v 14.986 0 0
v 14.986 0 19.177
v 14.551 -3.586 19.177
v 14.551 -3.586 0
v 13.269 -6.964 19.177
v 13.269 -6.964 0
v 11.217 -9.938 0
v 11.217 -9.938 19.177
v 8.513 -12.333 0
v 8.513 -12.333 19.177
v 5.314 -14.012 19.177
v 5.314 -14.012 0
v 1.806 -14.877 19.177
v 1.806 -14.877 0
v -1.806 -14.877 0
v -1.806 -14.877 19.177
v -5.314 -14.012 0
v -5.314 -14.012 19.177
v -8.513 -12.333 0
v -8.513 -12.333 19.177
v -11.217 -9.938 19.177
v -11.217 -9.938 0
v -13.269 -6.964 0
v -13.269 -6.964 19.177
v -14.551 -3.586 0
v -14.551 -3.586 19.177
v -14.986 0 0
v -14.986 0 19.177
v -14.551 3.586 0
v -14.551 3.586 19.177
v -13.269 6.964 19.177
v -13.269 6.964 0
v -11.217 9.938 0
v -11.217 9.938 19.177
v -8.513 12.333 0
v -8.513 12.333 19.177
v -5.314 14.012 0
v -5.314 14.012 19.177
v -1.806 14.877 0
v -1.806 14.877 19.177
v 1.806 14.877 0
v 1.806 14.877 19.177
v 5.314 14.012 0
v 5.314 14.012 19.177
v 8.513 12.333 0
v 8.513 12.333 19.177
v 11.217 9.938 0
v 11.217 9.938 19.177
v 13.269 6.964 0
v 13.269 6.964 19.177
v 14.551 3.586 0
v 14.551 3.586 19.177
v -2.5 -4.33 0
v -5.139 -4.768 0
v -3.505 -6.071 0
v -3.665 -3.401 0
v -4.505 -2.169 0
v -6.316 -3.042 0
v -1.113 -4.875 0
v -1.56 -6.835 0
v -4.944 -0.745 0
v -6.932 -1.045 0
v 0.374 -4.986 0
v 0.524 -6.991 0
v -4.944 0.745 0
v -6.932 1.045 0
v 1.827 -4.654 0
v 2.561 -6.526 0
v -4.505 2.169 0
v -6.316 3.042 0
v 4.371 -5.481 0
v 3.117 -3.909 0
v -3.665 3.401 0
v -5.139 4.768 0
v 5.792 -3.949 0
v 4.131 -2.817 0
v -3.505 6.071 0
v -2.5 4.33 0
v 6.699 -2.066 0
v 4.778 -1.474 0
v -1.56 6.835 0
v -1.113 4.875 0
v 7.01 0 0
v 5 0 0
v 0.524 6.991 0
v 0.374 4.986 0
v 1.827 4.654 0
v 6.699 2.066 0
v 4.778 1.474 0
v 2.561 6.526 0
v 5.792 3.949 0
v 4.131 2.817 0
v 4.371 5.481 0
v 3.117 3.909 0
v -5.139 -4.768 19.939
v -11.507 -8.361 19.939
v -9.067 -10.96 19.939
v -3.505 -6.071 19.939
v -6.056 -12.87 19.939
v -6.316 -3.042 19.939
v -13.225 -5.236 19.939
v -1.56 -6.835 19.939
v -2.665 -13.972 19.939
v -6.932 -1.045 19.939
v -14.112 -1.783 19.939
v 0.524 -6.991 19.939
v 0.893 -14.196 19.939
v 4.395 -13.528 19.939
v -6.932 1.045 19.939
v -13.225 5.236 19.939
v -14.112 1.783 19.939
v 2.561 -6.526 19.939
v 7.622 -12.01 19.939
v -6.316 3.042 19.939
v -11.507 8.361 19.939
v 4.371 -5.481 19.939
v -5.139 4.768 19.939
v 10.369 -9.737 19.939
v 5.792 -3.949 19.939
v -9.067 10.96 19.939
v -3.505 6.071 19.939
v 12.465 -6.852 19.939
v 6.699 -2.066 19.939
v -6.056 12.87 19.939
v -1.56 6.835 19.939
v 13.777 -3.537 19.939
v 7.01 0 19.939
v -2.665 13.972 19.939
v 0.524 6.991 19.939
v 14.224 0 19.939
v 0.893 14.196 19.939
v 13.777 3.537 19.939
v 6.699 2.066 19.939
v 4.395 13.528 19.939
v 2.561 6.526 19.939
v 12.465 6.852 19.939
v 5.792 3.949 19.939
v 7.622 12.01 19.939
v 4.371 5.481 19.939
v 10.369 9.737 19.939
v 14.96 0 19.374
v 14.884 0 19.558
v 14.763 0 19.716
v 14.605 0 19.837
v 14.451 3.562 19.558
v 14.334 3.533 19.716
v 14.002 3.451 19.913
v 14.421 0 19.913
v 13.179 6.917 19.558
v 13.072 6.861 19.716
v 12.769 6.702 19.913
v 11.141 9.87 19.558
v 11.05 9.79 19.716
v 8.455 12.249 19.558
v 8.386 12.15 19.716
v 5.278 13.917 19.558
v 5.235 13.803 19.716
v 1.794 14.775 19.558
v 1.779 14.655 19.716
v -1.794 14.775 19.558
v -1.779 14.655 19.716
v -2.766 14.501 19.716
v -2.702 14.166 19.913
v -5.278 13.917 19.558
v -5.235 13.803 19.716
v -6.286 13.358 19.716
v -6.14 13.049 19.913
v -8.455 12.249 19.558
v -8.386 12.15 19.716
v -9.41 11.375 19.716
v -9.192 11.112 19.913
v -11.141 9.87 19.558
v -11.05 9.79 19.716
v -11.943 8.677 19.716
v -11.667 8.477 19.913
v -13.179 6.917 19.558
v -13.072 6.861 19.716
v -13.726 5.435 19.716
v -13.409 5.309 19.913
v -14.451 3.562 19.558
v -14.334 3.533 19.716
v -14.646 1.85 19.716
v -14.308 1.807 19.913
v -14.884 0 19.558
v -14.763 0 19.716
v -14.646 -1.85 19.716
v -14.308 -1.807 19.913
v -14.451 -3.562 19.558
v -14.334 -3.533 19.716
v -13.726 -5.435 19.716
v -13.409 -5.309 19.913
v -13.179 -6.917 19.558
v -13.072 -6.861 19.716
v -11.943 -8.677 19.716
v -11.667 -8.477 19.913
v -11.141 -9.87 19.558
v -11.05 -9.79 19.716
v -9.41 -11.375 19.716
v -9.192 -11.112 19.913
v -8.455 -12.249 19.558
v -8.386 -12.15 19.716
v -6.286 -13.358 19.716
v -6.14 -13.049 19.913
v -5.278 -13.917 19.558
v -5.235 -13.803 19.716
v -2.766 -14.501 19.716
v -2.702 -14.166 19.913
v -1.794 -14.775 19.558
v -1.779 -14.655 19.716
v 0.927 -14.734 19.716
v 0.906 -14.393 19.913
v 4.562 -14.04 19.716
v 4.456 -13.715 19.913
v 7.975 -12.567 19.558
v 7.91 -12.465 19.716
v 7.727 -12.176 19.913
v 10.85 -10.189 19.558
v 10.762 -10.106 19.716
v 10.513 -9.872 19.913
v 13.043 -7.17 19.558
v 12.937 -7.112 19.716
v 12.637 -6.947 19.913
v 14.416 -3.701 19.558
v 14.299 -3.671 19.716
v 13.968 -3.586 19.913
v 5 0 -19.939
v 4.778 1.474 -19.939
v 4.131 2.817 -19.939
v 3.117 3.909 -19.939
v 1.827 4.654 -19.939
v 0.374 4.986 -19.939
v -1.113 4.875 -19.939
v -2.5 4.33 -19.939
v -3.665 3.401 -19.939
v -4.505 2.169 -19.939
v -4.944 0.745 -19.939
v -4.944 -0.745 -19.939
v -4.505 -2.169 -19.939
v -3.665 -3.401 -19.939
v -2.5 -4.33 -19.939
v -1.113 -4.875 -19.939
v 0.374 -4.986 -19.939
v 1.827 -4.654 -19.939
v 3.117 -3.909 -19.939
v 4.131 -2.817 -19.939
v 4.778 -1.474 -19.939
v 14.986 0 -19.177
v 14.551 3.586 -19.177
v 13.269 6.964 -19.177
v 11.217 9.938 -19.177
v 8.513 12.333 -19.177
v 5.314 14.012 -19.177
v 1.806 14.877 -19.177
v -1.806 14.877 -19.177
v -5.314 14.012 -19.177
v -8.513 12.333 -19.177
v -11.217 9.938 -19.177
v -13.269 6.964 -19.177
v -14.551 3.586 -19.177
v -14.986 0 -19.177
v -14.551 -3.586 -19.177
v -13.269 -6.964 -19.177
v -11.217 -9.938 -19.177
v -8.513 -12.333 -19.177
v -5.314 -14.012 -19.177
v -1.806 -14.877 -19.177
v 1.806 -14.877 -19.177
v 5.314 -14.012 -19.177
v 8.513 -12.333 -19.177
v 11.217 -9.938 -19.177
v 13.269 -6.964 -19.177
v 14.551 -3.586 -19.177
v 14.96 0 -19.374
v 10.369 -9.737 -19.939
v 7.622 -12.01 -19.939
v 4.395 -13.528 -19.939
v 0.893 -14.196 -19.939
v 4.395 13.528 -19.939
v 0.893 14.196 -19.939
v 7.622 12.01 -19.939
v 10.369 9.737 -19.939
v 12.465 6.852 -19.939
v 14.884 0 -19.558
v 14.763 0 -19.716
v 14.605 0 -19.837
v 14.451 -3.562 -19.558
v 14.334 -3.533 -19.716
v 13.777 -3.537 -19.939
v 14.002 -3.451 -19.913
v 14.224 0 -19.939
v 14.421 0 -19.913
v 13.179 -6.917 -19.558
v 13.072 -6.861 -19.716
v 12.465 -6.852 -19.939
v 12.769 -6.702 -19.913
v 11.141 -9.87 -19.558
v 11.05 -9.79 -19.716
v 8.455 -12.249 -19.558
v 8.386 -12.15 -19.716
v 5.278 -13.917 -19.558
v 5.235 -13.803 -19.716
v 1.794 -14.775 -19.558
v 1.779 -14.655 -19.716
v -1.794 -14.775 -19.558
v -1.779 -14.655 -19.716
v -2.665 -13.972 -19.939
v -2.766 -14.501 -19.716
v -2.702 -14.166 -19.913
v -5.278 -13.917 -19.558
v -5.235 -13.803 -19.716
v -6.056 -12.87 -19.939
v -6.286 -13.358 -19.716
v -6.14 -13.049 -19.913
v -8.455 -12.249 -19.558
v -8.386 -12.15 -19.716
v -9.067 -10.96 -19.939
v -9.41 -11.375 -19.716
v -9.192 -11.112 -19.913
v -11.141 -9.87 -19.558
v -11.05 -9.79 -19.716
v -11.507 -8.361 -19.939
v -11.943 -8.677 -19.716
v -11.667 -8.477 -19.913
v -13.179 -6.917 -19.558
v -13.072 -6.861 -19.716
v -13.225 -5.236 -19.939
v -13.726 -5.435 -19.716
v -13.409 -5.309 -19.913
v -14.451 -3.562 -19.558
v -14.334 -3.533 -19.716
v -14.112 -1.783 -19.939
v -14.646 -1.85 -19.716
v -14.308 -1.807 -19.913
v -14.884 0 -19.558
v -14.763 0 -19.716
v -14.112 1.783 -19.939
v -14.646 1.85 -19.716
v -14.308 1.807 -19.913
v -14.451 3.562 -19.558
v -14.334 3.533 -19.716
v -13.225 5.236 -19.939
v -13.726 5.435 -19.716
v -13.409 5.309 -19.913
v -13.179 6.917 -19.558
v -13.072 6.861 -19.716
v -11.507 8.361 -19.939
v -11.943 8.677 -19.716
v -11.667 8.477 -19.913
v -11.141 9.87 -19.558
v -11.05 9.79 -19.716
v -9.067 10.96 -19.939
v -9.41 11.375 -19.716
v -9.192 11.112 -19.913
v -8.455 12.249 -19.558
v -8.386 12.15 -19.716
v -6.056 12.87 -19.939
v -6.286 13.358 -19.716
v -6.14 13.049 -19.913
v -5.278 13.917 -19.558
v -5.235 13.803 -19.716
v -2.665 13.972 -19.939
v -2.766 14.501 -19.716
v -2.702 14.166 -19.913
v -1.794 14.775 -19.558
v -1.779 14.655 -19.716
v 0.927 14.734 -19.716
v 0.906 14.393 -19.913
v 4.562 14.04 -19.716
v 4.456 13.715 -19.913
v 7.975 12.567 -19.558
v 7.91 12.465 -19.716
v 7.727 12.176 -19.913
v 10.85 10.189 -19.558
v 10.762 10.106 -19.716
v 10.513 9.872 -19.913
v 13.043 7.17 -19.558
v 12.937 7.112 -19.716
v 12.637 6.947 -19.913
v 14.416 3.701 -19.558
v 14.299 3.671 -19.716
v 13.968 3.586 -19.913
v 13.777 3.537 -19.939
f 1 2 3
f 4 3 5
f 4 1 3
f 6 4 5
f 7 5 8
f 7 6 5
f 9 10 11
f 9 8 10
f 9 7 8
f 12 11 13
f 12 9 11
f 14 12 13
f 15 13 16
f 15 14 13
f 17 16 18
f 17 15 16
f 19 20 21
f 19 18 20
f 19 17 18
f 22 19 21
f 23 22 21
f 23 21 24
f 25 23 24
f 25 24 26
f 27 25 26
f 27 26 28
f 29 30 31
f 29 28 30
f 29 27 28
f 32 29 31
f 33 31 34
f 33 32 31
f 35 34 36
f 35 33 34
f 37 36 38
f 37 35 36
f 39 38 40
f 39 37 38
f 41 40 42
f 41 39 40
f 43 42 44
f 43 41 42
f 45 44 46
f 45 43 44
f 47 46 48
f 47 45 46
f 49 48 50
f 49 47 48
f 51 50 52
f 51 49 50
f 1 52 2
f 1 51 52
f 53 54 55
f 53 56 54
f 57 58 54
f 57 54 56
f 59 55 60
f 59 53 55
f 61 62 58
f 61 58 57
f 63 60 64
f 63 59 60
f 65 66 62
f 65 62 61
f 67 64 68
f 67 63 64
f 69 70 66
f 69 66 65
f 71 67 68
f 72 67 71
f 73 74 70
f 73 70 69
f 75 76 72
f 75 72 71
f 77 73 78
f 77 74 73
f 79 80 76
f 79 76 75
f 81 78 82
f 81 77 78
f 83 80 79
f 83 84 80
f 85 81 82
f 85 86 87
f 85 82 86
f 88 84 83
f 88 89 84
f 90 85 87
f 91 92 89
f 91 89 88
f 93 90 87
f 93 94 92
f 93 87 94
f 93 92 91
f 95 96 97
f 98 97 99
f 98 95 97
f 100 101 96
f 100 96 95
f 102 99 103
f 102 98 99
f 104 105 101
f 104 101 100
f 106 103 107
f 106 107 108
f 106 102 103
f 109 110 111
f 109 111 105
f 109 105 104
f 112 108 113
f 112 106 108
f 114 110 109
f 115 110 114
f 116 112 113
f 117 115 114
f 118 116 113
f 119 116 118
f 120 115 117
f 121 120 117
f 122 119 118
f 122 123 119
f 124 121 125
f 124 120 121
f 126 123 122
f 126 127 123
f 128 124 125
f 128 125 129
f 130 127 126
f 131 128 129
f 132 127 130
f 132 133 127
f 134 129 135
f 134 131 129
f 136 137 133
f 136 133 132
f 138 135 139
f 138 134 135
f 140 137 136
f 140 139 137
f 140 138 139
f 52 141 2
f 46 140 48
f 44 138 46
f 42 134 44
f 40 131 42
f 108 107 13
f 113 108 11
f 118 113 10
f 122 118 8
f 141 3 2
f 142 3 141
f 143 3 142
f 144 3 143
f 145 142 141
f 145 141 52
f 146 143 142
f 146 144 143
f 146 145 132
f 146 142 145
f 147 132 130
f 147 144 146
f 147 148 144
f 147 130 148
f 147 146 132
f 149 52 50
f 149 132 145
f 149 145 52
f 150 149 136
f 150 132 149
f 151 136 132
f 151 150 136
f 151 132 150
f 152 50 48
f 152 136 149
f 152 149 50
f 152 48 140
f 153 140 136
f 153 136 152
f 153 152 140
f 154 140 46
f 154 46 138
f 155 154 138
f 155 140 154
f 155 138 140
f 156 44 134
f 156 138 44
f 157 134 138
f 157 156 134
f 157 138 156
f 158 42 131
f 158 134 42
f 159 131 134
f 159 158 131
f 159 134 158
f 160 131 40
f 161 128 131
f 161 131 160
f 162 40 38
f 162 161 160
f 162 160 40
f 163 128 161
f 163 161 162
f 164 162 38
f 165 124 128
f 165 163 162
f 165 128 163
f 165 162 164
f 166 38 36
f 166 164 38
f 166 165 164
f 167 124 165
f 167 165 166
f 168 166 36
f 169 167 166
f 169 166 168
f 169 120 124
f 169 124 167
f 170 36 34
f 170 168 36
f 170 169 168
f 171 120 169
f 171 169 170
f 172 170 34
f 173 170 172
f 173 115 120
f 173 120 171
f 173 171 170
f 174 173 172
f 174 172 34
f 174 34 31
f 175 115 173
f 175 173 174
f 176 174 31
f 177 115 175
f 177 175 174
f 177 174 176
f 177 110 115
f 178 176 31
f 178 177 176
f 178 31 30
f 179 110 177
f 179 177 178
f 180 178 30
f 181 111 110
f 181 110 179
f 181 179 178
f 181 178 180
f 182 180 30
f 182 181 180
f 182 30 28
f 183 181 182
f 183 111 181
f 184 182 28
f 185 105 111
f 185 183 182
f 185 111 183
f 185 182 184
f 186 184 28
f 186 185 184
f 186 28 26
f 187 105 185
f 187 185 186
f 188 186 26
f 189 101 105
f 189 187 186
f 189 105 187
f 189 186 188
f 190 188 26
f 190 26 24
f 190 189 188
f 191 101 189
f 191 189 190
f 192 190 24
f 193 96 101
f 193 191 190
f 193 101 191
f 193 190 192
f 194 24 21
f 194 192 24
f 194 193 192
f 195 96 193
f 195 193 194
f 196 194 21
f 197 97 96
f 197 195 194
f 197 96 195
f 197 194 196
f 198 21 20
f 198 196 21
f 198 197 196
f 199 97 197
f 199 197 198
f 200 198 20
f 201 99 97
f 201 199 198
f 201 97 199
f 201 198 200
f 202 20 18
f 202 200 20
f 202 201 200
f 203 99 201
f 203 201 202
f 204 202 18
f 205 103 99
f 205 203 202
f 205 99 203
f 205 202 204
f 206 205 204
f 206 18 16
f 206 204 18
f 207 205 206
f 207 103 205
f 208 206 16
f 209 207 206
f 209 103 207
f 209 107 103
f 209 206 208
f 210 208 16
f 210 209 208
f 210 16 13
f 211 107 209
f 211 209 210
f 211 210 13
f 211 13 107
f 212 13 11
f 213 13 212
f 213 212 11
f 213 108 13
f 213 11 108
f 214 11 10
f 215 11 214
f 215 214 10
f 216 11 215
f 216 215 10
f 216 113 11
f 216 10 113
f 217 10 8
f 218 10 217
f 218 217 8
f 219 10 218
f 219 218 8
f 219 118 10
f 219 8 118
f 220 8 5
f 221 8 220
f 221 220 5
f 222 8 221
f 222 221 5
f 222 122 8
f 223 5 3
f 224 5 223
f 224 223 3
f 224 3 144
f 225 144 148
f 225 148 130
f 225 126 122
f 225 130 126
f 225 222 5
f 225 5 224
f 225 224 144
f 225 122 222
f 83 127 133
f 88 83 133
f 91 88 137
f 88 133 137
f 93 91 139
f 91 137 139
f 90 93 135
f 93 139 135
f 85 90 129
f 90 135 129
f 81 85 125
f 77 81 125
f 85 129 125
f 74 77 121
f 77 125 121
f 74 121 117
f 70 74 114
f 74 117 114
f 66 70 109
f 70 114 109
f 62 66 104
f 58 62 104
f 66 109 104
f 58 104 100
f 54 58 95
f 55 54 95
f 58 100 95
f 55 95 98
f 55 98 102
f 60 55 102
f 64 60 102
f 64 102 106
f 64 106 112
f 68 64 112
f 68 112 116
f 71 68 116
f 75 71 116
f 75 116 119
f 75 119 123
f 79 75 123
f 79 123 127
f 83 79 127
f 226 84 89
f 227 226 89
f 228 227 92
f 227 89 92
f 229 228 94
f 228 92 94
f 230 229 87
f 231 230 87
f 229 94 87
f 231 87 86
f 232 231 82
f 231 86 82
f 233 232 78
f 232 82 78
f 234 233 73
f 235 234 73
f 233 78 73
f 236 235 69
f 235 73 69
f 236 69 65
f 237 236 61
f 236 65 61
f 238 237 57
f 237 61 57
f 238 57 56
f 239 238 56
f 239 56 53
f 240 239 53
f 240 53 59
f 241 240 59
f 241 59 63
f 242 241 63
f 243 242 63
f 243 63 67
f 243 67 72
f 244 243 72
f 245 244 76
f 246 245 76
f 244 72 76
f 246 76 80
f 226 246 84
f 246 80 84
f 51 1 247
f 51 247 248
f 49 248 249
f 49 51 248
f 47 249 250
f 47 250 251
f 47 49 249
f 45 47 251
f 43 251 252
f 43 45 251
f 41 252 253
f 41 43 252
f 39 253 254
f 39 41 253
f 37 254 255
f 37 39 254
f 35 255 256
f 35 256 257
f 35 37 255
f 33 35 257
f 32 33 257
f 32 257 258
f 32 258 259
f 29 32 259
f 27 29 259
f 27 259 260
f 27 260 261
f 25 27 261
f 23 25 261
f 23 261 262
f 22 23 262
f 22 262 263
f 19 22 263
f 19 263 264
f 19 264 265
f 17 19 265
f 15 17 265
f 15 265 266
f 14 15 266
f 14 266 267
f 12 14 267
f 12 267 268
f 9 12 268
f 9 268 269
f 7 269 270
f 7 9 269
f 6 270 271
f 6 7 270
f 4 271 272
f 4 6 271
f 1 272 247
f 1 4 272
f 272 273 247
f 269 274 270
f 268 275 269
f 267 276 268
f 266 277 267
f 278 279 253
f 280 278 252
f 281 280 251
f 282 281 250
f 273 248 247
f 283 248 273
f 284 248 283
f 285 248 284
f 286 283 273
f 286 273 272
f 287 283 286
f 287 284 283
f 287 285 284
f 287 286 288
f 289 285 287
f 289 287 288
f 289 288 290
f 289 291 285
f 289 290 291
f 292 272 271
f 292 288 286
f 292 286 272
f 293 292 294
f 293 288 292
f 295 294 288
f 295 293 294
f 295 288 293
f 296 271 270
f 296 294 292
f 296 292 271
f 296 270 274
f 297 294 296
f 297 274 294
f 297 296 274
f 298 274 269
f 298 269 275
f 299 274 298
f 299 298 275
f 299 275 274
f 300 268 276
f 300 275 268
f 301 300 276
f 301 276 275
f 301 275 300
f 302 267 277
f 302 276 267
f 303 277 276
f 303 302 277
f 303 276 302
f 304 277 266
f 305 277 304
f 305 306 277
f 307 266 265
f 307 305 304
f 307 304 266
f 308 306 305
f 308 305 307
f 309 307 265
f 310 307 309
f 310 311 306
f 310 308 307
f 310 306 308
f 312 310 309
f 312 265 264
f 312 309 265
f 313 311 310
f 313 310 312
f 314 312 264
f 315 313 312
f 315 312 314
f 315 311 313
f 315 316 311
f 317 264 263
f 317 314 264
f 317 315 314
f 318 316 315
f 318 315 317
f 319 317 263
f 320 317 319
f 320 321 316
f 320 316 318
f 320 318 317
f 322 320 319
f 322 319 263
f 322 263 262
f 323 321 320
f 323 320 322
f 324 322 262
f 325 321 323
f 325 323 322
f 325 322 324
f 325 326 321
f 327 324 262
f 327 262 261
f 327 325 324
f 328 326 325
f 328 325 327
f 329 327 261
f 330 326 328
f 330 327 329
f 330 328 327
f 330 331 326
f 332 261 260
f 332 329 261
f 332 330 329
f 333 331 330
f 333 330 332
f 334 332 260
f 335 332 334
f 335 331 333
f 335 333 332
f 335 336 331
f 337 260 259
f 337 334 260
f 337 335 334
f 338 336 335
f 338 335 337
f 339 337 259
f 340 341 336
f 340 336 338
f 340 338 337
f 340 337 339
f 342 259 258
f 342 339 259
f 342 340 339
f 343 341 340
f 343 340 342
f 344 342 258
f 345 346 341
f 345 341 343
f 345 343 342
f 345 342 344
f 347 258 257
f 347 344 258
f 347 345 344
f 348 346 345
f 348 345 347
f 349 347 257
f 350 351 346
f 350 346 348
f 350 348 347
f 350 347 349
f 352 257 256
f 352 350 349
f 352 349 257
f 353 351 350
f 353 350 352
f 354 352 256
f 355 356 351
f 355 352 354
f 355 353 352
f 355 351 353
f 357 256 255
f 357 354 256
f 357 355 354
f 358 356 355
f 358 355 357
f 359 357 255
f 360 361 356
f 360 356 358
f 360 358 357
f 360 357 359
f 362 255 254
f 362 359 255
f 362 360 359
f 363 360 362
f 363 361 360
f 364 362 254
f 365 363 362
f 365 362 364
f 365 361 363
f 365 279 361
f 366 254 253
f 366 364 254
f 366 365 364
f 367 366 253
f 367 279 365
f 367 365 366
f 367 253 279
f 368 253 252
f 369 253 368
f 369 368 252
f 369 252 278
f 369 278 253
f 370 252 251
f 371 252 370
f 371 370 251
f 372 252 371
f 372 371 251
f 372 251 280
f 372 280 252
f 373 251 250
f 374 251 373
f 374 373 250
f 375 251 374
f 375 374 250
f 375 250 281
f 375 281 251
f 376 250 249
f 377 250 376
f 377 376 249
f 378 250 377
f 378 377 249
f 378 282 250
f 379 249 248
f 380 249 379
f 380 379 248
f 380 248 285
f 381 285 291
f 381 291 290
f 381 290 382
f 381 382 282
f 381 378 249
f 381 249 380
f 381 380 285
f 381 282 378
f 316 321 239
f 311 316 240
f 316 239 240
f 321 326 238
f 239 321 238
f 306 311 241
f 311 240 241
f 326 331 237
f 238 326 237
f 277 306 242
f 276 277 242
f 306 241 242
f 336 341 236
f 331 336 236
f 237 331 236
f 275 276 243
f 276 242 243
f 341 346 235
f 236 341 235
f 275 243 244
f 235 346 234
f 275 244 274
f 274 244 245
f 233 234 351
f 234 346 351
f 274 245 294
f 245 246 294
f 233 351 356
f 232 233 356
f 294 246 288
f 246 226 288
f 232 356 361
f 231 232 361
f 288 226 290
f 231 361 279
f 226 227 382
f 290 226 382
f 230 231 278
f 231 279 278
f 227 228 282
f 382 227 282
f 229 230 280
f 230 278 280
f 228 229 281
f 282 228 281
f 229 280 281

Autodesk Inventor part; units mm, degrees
ref_plane "YZ Plane" through (0, 0, 0) normal (1, 0, 0) x (0, 1, 0)
ref_plane "XZ Plane" through (0, 0, 0) normal (0, 1, 0) x (-1, 0, 0)
ref_plane "XY Plane" through (0, 0, 0) normal (0, 0, 1) x (1, 0, 0)
sketch "Sketch12" plane through (0, 0, 0) normal (0, 0, 1) x (1, 0, 0)
  circle A0 centre (0, 0) radius 14.986
  circle A1 centre (0, 0) radius 5
  dimension "d107" = 29.972
  dimension "d108" = 10
extrude "Extrusion1" add sketch "Sketch12" along normal mid plane 39.878
sketch "Sketch13" plane through (0, 0, 19.939) normal (0, 0, 1) x (1, 0, 0)
  circle A0 centre (0, 0) radius 5 construction
  circle A1 centre (0, 0) radius 7.0104
  dimension "d111" = 14.0208
extrude "Extrusion2" cut sketch "Sketch13" against normal blind 19.939
fillet "Fillet1" radius 0.762 2 edges at (-14.986, 0, -19.939) (-14.986, 0, 19.939)
equation "\"BendRadius\" = Thickness"
equation "\"BendReliefWidth\" = Thickness"
equation "\"BendReliefDepth\" = 0.5 * Thickness"
equation "\"CornerReliefSize\" = 4 * Thickness"
equation "\"MinimumRemnant\" = 2 * Thickness"
equation "\"TransitionRadius\" = BendRadius"
equation "\"JacobiRadiusSize\" = BendRadius"
equation "\"GapSize\" = Thickness"
equation "\"Thickness\" = 4.7625"
properties part number "Shaft Coupler" material "Steel, Mild"
